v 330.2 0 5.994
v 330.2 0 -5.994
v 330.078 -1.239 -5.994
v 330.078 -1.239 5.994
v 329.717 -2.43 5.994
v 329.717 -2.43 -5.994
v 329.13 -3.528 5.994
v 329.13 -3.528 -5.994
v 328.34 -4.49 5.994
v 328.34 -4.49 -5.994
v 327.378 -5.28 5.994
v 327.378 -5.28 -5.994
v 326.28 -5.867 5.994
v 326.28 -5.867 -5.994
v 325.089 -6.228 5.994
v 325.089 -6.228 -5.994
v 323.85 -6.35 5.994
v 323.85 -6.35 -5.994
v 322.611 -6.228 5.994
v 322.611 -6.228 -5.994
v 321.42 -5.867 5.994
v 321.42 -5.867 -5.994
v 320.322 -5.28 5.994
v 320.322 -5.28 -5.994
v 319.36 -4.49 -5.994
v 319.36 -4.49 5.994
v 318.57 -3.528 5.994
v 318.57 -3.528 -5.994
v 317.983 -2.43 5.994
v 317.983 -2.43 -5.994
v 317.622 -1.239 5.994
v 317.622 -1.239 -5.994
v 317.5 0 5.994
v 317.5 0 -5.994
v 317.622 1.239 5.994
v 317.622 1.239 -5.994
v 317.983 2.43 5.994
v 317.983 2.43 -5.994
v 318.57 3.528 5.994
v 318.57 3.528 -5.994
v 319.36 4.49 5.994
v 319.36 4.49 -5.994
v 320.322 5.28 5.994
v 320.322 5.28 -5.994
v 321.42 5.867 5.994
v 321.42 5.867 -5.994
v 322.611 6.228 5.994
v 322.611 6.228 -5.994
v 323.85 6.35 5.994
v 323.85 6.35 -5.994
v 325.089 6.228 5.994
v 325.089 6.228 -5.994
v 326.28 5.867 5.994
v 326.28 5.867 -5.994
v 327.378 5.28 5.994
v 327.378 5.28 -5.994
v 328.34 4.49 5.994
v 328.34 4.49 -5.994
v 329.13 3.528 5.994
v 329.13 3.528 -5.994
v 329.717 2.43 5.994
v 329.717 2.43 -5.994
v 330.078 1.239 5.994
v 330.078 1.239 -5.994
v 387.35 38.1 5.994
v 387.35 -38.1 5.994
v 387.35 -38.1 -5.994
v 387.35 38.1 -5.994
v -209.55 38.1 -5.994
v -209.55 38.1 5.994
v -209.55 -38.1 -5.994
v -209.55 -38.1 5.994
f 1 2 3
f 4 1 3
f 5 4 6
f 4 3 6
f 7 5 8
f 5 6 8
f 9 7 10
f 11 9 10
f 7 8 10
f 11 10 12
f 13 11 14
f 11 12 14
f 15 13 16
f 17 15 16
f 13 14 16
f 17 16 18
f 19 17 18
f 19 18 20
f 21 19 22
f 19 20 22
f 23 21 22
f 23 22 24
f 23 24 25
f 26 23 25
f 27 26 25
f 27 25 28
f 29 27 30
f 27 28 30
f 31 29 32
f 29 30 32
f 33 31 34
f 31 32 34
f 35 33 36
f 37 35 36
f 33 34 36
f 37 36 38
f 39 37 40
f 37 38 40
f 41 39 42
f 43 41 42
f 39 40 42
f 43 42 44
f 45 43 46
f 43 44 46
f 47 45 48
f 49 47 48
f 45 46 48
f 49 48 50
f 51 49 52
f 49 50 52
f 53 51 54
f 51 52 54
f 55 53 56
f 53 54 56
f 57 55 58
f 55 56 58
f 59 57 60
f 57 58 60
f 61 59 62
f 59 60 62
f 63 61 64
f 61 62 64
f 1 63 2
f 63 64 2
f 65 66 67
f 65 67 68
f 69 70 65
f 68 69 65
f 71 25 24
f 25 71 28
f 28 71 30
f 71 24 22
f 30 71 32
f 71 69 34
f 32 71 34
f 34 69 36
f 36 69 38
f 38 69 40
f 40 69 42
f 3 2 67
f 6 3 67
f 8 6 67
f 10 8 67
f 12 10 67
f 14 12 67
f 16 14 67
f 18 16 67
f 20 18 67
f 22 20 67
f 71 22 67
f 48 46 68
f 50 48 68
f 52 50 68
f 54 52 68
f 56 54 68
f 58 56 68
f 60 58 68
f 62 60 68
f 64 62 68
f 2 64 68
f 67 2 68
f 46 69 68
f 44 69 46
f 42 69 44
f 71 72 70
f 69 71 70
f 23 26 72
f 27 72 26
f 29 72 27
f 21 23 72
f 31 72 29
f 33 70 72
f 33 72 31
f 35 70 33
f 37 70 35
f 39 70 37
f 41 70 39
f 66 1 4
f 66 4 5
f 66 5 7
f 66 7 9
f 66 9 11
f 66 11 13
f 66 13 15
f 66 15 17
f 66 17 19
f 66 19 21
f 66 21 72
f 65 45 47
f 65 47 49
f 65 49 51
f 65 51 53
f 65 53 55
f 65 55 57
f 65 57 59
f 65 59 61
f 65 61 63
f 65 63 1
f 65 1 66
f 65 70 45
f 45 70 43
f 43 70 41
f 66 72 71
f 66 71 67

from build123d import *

# Parameters (mm, degrees)
F0_W     = 774.7
F0_H     = 76.2
F1_DEPTH = 5.9944
F2_R     = 6.35
F3_DEPTH = 11.9888
F4_R     = 6.35
F5_DEPTH = 11.9888
F6_W     = 177.8
F6_H     = 76.2
F7_DEPTH = 11.9888


with BuildPart() as f1:
    # F0 (on Top) → F1 (new body, symmetric)
    with BuildSketch(Plane.XY):
        Rectangle(F0_W, F0_H)
    extrude(amount=F1_DEPTH, both=True)

    # F2 (on face) → F3 (cut, through all)
    with BuildSketch(Plane(origin=(0, 0, -5.9944), x_dir=(1, 0, 0), z_dir=(0, 0, -1))):
        with Locations((-316.70625, 0)):
            Circle(F2_R)
        with Locations((323.85, 0)):
            Circle(F2_R)
    extrude(amount=-F3_DEPTH, mode=Mode.SUBTRACT)

    # F4 (on face) → F5 (cut, through all)
    with BuildSketch(Plane.XY.offset(5.9944)):
        with Locations((-349.25, 0)):
            Circle(F4_R)
        with Locations((-234.95, 0)):
            Circle(F4_R)
    extrude(amount=-F5_DEPTH, mode=Mode.SUBTRACT)

    # F6 (on face) → F7 (cut, through all)
    with BuildSketch(Plane.XY.offset(5.9944)):
        with Locations((-298.45, 0)):
            Rectangle(F6_W, F6_H)
    extrude(amount=-F7_DEPTH, mode=Mode.SUBTRACT)


solid = f1.part
